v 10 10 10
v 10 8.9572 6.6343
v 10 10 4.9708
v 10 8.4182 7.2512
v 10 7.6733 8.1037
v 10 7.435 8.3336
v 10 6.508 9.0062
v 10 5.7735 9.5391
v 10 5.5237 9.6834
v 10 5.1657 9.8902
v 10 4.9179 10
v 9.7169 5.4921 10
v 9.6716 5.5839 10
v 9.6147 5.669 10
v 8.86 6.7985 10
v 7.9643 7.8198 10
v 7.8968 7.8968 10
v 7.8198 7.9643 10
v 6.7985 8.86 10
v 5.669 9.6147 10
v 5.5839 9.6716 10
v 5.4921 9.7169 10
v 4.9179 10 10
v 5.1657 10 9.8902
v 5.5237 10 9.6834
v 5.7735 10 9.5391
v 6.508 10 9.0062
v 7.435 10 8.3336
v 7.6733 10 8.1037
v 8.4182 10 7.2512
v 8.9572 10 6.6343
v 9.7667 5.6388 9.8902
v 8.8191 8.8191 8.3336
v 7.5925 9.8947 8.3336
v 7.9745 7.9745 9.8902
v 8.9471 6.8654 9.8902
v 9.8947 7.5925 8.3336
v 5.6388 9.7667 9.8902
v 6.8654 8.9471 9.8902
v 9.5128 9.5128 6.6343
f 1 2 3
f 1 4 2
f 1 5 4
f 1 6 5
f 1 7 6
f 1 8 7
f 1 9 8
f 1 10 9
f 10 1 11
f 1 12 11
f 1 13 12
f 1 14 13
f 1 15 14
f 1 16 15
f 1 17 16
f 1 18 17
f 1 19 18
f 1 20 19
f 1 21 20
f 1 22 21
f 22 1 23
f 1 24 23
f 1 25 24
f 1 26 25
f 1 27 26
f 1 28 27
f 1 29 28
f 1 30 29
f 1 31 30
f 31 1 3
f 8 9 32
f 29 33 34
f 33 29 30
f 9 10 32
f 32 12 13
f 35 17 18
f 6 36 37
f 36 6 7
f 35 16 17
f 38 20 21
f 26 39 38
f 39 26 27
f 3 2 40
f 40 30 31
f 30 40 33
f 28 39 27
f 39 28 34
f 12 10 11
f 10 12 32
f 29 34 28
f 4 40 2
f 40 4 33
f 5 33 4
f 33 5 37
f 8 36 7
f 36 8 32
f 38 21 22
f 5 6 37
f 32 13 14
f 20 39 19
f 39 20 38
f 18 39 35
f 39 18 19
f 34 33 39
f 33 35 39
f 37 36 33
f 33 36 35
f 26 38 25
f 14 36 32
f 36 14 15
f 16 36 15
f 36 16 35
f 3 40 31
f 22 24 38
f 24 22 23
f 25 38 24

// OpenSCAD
$fn = 48;

union() {
	difference() {
		cube(size = 10);
		sphere(r = 15);
	}
	difference() {
		circle(r = 10);
		rotate(a = 90) {
			translate(v = [0, -10, 0]) {
				square(center = true, size = [30, 20]);
			}
		}
		rotate(a = 30) {
			translate(v = [0, -10, 0]) {
				square(center = true, size = [30, 20]);
			}
		}
	}
	difference() {
		circle(r = 10);
		rotate(a = 45) {
			translate(v = [0, -10, 0]) {
				square(center = true, size = [30, 20]);
			}
		}
		rotate(a = -125) {
			translate(v = [0, -10, 0]) {
				square(center = true, size = [30, 20]);
			}
		}
	}
}
/***********************************************
*********      SolidPython code:      **********
************************************************
 
#! /usr/bin/env python
# -*- coding: UTF-8 -*-
from __future__ import division
import os
import sys
import re

# Assumes SolidPython is in site-packages or elsewhwere in sys.path
from solid import *
from solid.utils import *

SEGMENTS = 48


def assembly():
    # Your code here!
    a = union() (
        difference() (
            cube(10),  # Note the comma between each element!
            sphere(15)
        ),
        arc(rad=10, start_degrees=90, end_degrees=210),
        arc(rad=10, start_degrees=45, end_degrees=55)
    )

    return a

if __name__ == '__main__':
    a = assembly()
    scad_render_to_file(a, file_header='$fn = %s;' % SEGMENTS, include_orig_code=True)





 
 
************************************************/
